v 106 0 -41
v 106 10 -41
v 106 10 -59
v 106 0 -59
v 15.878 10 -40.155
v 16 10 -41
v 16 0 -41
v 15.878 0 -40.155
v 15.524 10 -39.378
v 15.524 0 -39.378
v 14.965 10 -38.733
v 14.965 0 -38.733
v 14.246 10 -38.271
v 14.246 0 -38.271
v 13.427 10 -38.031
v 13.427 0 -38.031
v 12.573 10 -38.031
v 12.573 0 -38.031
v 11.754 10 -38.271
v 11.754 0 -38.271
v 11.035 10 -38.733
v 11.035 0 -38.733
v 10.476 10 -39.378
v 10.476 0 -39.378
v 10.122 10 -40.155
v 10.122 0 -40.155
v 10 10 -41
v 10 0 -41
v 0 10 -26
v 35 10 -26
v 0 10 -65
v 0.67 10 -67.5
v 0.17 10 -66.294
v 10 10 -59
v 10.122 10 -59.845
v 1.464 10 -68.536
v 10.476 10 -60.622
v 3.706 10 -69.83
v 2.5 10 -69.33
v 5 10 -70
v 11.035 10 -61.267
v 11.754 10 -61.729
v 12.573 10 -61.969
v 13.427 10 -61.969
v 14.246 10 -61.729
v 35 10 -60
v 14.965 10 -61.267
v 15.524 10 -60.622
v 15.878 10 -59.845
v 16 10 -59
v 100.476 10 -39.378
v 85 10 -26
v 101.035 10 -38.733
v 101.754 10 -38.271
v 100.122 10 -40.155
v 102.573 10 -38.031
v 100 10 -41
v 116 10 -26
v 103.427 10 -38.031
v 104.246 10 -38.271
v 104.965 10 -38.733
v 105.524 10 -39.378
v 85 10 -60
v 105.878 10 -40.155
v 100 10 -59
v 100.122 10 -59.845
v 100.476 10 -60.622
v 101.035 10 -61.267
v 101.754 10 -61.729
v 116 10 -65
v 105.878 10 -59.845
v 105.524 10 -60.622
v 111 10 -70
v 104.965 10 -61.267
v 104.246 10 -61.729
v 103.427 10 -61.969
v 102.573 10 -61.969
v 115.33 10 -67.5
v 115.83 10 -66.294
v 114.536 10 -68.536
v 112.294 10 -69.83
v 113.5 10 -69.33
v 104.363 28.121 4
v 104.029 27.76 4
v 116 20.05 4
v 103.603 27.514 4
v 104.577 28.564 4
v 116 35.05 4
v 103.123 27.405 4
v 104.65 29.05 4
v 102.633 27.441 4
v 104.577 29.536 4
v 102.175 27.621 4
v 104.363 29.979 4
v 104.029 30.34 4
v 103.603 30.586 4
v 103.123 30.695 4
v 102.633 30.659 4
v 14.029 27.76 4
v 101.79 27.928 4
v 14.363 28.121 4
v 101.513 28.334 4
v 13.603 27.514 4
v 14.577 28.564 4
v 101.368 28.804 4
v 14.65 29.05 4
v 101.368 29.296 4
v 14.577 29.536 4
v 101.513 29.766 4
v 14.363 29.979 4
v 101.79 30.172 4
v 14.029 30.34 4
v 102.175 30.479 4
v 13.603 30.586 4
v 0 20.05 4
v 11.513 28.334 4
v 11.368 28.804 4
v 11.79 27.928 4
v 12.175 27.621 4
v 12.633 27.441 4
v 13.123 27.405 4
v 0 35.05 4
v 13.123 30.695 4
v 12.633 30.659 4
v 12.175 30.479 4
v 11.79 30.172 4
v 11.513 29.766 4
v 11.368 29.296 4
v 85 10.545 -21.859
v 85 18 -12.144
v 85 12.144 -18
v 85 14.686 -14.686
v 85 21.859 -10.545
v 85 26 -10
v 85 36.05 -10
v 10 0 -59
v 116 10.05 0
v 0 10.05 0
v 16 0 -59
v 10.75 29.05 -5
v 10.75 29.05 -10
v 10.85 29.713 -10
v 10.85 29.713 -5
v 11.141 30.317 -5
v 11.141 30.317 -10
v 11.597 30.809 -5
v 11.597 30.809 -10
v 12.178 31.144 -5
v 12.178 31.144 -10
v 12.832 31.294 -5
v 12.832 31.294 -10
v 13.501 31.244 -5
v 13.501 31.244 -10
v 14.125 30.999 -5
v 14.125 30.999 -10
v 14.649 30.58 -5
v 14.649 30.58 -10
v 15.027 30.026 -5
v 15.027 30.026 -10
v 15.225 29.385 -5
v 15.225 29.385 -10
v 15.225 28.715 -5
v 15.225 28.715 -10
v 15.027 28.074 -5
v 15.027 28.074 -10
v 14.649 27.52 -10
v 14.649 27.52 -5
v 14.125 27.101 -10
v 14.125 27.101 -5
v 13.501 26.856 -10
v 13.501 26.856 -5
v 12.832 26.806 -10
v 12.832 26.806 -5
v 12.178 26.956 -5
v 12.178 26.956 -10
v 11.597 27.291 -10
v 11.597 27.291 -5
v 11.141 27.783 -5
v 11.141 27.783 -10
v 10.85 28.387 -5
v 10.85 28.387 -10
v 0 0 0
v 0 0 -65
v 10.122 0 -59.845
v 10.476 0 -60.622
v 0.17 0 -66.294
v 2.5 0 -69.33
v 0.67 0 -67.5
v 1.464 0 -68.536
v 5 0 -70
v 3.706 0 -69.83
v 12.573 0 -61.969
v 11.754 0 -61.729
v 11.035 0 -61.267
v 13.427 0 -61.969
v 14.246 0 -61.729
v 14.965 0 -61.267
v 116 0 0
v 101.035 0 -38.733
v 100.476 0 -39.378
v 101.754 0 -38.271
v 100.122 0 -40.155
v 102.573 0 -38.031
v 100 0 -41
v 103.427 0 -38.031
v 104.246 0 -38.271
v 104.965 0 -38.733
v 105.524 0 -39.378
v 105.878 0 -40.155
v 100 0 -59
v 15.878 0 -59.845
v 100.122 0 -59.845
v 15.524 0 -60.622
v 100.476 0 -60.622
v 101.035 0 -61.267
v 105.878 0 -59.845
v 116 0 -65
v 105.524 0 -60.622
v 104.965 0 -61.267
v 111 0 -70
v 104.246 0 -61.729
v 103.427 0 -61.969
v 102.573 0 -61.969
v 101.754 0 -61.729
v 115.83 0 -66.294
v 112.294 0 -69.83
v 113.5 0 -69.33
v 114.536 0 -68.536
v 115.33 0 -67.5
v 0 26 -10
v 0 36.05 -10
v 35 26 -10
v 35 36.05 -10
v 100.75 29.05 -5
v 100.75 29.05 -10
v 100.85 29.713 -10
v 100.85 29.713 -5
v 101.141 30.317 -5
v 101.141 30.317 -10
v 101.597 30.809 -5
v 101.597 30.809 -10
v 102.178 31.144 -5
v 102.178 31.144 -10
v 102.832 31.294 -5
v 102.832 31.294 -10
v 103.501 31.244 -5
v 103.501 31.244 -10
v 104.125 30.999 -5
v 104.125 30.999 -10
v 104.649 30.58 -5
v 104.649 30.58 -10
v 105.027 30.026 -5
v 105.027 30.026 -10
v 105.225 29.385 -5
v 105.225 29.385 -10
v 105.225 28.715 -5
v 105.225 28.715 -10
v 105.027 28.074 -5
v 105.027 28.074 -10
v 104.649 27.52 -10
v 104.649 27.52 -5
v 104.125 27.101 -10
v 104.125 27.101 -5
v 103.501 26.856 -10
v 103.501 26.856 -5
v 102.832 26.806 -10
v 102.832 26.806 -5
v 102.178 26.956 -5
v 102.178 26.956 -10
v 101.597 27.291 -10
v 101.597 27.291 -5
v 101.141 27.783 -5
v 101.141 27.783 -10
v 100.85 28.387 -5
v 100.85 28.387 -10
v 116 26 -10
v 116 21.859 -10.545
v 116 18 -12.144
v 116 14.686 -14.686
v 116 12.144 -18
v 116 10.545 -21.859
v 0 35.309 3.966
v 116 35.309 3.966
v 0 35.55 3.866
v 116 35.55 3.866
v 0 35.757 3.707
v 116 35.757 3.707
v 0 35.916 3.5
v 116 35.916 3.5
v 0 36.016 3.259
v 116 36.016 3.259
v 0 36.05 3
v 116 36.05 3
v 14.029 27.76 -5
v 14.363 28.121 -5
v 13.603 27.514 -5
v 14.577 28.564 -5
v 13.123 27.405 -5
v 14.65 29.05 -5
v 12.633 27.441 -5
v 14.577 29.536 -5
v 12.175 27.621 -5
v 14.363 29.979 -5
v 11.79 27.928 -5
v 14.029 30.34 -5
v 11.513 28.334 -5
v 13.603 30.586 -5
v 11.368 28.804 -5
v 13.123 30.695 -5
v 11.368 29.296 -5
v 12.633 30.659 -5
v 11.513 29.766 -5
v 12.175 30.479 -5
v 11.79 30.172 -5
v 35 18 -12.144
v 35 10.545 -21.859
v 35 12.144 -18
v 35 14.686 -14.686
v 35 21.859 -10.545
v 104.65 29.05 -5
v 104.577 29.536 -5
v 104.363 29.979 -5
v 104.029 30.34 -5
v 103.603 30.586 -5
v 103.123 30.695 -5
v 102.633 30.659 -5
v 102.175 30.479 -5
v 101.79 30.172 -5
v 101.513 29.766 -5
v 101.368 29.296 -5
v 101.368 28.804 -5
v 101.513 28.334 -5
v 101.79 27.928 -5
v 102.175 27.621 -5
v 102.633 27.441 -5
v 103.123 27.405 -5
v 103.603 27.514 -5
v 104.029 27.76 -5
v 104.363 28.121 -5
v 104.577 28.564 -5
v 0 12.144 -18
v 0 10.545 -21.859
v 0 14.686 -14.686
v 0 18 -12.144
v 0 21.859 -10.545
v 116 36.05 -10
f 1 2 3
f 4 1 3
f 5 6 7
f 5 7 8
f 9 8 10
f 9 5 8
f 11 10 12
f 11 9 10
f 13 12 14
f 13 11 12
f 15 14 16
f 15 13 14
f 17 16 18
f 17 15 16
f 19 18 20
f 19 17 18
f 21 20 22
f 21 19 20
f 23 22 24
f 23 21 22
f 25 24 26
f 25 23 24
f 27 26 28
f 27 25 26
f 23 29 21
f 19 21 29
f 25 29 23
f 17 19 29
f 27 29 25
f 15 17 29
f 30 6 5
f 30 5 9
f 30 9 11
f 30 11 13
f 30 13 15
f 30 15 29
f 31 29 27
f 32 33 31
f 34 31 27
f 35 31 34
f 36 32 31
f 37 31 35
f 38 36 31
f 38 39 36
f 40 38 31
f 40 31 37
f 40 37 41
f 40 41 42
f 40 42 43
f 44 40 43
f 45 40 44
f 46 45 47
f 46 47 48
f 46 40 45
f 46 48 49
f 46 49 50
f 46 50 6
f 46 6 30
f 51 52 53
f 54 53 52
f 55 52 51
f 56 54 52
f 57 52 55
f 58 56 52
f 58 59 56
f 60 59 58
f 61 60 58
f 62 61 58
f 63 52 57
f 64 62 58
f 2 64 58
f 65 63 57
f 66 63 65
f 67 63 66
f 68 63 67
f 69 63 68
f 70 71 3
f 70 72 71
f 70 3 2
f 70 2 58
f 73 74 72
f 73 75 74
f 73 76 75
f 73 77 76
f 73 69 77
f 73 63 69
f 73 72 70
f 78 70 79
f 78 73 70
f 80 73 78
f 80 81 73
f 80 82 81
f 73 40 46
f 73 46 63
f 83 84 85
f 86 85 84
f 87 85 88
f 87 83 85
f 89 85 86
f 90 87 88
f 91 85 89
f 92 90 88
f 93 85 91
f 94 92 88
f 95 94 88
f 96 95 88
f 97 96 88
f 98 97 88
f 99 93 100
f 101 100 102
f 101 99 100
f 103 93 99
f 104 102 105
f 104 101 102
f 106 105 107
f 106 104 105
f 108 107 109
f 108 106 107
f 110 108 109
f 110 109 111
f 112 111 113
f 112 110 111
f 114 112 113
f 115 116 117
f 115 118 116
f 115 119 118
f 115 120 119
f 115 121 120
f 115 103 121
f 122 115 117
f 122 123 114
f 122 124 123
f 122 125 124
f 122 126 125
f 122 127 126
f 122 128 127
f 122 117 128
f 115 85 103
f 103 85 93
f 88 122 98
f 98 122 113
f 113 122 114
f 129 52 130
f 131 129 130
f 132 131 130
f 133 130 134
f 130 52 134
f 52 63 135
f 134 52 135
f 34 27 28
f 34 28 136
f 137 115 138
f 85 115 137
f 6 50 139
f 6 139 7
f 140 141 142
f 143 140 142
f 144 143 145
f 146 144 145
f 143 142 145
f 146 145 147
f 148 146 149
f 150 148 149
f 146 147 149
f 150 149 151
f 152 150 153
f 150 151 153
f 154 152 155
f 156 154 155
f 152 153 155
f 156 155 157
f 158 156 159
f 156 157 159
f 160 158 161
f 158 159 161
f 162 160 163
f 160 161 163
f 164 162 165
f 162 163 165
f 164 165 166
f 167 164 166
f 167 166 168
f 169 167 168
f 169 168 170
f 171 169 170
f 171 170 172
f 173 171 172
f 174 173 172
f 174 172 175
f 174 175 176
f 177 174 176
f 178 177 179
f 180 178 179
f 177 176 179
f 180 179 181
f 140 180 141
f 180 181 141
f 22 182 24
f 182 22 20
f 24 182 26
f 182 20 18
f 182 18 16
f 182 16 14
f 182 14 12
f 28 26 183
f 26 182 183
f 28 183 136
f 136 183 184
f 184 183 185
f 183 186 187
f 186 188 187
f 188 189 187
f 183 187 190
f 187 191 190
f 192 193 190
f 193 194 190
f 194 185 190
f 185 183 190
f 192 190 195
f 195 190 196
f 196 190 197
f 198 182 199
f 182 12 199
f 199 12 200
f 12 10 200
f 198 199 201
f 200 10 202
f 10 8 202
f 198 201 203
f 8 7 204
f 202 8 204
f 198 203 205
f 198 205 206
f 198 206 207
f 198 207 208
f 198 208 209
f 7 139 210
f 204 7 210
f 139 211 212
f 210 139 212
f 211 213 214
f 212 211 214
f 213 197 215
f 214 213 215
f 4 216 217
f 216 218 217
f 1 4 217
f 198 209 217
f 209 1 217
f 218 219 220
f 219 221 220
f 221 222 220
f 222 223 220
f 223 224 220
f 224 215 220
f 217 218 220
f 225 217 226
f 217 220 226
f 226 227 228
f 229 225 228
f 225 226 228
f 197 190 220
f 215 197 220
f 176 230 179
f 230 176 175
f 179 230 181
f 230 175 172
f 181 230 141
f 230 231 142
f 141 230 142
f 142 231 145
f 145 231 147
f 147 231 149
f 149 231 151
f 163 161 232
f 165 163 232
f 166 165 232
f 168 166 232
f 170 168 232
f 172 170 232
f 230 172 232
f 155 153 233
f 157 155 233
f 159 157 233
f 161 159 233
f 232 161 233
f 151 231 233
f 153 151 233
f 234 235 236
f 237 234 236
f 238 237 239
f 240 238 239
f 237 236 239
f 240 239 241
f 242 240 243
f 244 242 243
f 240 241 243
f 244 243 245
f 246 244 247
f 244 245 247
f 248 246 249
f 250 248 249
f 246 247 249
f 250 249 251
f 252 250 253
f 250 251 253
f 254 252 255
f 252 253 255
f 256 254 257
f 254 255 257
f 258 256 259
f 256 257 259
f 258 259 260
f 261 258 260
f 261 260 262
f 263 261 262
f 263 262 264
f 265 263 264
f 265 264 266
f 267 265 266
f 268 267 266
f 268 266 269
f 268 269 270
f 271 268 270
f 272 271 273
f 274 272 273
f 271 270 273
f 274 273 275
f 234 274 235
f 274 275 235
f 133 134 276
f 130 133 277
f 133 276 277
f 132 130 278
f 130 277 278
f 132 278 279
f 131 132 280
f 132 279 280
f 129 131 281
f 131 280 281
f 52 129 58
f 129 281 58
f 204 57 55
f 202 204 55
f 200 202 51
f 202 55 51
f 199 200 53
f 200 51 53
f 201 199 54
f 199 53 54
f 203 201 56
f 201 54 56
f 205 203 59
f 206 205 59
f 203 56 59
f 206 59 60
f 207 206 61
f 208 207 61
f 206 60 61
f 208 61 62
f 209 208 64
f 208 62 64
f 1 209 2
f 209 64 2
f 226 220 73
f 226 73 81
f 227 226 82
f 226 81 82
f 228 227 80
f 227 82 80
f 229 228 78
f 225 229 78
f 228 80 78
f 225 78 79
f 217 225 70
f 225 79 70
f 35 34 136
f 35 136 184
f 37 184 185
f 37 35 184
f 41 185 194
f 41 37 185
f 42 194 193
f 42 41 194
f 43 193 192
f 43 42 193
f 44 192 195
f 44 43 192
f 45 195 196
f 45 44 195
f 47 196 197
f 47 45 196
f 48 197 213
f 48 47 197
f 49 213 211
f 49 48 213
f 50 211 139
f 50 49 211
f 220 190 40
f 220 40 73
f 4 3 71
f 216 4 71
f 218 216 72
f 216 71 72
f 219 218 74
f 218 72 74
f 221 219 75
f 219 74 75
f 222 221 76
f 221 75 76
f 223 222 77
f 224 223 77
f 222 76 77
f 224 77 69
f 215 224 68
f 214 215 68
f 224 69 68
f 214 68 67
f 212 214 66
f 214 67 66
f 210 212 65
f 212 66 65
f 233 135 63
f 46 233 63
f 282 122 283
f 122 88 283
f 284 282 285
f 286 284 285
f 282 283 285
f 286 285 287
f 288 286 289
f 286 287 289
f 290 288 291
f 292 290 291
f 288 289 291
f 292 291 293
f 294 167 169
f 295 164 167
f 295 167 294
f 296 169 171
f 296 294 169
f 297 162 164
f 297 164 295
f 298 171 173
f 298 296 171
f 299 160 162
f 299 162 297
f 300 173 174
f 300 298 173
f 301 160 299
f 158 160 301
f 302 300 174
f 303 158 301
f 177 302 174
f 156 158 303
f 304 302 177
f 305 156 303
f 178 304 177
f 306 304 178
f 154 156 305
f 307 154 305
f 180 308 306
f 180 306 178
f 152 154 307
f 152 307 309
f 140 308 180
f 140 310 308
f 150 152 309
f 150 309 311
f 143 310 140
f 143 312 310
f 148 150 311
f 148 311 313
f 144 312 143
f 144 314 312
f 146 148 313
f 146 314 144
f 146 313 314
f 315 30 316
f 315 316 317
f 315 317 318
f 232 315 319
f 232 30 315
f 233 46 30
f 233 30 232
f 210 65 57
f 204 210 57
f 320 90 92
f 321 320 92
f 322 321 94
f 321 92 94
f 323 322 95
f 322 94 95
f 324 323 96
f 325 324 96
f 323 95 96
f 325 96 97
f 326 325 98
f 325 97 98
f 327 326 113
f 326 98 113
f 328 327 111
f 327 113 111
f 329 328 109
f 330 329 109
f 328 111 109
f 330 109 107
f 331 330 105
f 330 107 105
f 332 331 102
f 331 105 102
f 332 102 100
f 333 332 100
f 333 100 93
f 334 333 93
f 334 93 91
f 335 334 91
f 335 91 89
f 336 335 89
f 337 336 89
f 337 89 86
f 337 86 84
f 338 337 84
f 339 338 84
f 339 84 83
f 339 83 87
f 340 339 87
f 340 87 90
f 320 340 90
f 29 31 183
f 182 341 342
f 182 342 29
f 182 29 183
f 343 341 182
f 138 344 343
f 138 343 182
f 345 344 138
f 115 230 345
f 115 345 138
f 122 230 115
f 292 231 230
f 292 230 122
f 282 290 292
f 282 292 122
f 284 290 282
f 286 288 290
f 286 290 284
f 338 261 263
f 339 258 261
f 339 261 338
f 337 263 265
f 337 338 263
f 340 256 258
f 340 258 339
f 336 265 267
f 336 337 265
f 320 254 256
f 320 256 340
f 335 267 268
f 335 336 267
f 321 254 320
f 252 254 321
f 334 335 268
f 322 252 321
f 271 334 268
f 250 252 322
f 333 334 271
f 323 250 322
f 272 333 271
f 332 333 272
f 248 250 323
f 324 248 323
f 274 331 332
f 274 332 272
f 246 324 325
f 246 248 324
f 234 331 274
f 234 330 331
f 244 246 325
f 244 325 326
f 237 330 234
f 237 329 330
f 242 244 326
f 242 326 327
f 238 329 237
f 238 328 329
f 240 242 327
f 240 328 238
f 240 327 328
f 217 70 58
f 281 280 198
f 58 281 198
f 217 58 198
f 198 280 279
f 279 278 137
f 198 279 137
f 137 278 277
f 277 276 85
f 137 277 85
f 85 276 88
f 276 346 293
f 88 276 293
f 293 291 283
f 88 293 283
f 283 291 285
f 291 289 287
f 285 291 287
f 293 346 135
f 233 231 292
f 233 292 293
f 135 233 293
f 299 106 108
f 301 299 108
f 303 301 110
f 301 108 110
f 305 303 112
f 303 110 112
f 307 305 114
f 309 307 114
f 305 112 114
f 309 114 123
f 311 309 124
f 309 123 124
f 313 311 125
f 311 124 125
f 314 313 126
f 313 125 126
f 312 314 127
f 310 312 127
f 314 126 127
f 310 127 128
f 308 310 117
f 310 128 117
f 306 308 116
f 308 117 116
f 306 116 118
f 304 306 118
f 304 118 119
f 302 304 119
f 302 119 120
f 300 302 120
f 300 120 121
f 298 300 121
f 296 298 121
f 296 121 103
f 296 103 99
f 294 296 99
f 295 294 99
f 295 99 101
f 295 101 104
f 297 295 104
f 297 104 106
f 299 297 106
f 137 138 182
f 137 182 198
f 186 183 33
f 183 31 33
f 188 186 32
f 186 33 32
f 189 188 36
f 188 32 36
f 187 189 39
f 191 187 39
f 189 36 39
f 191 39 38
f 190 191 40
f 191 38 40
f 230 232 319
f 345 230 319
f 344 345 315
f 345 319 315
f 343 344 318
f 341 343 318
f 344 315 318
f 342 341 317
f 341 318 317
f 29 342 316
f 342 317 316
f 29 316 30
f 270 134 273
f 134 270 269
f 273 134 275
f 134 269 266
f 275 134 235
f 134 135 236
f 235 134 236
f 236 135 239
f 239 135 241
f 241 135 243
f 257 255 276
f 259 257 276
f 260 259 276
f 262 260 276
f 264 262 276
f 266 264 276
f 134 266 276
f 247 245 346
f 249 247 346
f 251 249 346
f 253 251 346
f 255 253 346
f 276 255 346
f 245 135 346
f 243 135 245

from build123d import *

# Parameters (mm, degrees)
SKETCH1_W           = 116
SKETCH1_H           = 70
BOSS_EXTRUDE1_DEPTH = 10
SKETCH2_W           = 116
SKETCH2_H           = 9.05
BOSS_EXTRUDE2_DEPTH = 10
CUT_EXTRUDE1_DEPTH  = 136.852861582
SKETCH4_W           = 116
SKETCH4_H           = 17
BOSS_EXTRUDE3_DEPTH = 10
FILLET1_R           = 16
BOSS_EXTRUDE4_START = -85
BOSS_EXTRUDE4_DEPTH = 50
SKETCH7_W           = 4
SKETCH7_H           = 16
BOSS_EXTRUDE5_DEPTH = 116
CHAMFER1_SIZE2      = 4
CHAMFER1_SIZE       = 10
FILLET3_R           = 1
FILLET4_R           = 5
SKETCH8_R           = 1.65
CUT_EXTRUDE2_DEPTH  = 143.237837793
SKETCH9_R           = 2.25
CUT_EXTRUDE3_DEPTH  = 5


with BuildPart() as part:
    # Sketch1 → Boss-Extrude1 (new body)
    with BuildSketch(Plane(origin=(0, 0, 0), x_dir=(1, 0, 0), z_dir=(0, 1, 0))):
        with Locations((58, 35)):
            Rectangle(SKETCH1_W, SKETCH1_H)
    extrude(amount=BOSS_EXTRUDE1_DEPTH)

    # Sketch2 → Boss-Extrude2 (add)
    with BuildSketch(Plane.XY):
        with Locations((58, 14.525)):
            Rectangle(SKETCH2_W, SKETCH2_H)
    extrude(amount=-BOSS_EXTRUDE2_DEPTH)

    # Sketch3 → Cut-Extrude1 (cut, through all)
    with BuildSketch(Plane(origin=(0, 10, 0), x_dir=(1, 0, 0), z_dir=(0, 1, 0))):
        with BuildLine():
            Line((16, 59), (16, 41))
            ThreePointArc((16, 41), (13, 38), (10, 41))
            Line((10, 41), (10, 59))
            ThreePointArc((10, 59), (13, 62), (16, 59))
        make_face()
        with BuildLine():
            Line((100, 59), (100, 41))
            ThreePointArc((100, 41), (103, 38), (106, 41))
            Line((106, 41), (106, 59))
            ThreePointArc((106, 59), (103, 62), (100, 59))
        make_face()
    extrude(amount=-CUT_EXTRUDE1_DEPTH, mode=Mode.SUBTRACT)

    # Sketch4 → Boss-Extrude3 (add)
    with BuildSketch(Plane.XY):
        with Locations((58, 27.55)):
            Rectangle(SKETCH4_W, SKETCH4_H)
    extrude(amount=-BOSS_EXTRUDE3_DEPTH)

    # Fillet1
    fillet1_edges = [part.edges().sort_by_distance(p)[0] for p in [
        (58, 10, -10),
    ]]
    fillet(fillet1_edges, radius=FILLET1_R)

    # Sketch6 → Boss-Extrude4 (add)
    with BuildSketch(Plane.ZY.offset(BOSS_EXTRUDE4_START)):
        with BuildLine():
            Line((-10, 36.05), (-60, 10))
            Line((-60, 10), (-26, 10))
            ThreePointArc((-26, 10), (-14.686291501, 14.686291501), (-10, 26))
            Line((-10, 26), (-10, 36.05))
        make_face()
    extrude(amount=BOSS_EXTRUDE4_DEPTH)

    # Sketch7 → Boss-Extrude5 (add)
    with BuildSketch(Plane.ZY):
        with Locations((2, 28.05)):
            Rectangle(SKETCH7_W, SKETCH7_H)
    extrude(amount=-BOSS_EXTRUDE5_DEPTH)

    # Chamfer1
    chamfer1_edges = [part.edges().sort_by_distance(p)[0] for p in [
        (58, 20.05, 0),
    ]]
    chamfer1_side = [part.faces().sort_by_distance(p)[0] for p in [
        (58, 19.97, 0),
    ]]
    chamfer(chamfer1_edges, length=CHAMFER1_SIZE - 0.0001, length2=CHAMFER1_SIZE2 - 0.0001, reference=chamfer1_side[0])  # a hair under: the kernel refuses the full size

    # Fillet3
    fillet3_edges = [part.edges().sort_by_distance(p)[0] for p in [
        (58, 36.05, 4),
    ]]
    fillet(fillet3_edges, radius=FILLET3_R)

    # Fillet4
    fillet4_edges = [part.edges().sort_by_distance(p)[0] for p in [
        (0, 5, -70),
        (116, 5, -70),
    ]]
    fillet(fillet4_edges, radius=FILLET4_R)

    # Sketch8 → Cut-Extrude2 (cut, through all)
    with BuildSketch(Plane.XY.offset(4)):
        with Locations((13, 29.05)):
            Circle(SKETCH8_R)
        with Locations((103, 29.05)):
            Circle(SKETCH8_R)
    extrude(amount=-CUT_EXTRUDE2_DEPTH, mode=Mode.SUBTRACT)

    # Sketch9 → Cut-Extrude3 (cut)
    with BuildSketch(Plane(origin=(0, 0, -10), x_dir=(-1, 0, 0), z_dir=(0, 0, -1))):
        with Locations((-103, 29.05)):
            Circle(SKETCH9_R)
        with Locations((-13, 29.05)):
            Circle(SKETCH9_R)
    extrude(amount=-CUT_EXTRUDE3_DEPTH, mode=Mode.SUBTRACT)


solid = part.part
